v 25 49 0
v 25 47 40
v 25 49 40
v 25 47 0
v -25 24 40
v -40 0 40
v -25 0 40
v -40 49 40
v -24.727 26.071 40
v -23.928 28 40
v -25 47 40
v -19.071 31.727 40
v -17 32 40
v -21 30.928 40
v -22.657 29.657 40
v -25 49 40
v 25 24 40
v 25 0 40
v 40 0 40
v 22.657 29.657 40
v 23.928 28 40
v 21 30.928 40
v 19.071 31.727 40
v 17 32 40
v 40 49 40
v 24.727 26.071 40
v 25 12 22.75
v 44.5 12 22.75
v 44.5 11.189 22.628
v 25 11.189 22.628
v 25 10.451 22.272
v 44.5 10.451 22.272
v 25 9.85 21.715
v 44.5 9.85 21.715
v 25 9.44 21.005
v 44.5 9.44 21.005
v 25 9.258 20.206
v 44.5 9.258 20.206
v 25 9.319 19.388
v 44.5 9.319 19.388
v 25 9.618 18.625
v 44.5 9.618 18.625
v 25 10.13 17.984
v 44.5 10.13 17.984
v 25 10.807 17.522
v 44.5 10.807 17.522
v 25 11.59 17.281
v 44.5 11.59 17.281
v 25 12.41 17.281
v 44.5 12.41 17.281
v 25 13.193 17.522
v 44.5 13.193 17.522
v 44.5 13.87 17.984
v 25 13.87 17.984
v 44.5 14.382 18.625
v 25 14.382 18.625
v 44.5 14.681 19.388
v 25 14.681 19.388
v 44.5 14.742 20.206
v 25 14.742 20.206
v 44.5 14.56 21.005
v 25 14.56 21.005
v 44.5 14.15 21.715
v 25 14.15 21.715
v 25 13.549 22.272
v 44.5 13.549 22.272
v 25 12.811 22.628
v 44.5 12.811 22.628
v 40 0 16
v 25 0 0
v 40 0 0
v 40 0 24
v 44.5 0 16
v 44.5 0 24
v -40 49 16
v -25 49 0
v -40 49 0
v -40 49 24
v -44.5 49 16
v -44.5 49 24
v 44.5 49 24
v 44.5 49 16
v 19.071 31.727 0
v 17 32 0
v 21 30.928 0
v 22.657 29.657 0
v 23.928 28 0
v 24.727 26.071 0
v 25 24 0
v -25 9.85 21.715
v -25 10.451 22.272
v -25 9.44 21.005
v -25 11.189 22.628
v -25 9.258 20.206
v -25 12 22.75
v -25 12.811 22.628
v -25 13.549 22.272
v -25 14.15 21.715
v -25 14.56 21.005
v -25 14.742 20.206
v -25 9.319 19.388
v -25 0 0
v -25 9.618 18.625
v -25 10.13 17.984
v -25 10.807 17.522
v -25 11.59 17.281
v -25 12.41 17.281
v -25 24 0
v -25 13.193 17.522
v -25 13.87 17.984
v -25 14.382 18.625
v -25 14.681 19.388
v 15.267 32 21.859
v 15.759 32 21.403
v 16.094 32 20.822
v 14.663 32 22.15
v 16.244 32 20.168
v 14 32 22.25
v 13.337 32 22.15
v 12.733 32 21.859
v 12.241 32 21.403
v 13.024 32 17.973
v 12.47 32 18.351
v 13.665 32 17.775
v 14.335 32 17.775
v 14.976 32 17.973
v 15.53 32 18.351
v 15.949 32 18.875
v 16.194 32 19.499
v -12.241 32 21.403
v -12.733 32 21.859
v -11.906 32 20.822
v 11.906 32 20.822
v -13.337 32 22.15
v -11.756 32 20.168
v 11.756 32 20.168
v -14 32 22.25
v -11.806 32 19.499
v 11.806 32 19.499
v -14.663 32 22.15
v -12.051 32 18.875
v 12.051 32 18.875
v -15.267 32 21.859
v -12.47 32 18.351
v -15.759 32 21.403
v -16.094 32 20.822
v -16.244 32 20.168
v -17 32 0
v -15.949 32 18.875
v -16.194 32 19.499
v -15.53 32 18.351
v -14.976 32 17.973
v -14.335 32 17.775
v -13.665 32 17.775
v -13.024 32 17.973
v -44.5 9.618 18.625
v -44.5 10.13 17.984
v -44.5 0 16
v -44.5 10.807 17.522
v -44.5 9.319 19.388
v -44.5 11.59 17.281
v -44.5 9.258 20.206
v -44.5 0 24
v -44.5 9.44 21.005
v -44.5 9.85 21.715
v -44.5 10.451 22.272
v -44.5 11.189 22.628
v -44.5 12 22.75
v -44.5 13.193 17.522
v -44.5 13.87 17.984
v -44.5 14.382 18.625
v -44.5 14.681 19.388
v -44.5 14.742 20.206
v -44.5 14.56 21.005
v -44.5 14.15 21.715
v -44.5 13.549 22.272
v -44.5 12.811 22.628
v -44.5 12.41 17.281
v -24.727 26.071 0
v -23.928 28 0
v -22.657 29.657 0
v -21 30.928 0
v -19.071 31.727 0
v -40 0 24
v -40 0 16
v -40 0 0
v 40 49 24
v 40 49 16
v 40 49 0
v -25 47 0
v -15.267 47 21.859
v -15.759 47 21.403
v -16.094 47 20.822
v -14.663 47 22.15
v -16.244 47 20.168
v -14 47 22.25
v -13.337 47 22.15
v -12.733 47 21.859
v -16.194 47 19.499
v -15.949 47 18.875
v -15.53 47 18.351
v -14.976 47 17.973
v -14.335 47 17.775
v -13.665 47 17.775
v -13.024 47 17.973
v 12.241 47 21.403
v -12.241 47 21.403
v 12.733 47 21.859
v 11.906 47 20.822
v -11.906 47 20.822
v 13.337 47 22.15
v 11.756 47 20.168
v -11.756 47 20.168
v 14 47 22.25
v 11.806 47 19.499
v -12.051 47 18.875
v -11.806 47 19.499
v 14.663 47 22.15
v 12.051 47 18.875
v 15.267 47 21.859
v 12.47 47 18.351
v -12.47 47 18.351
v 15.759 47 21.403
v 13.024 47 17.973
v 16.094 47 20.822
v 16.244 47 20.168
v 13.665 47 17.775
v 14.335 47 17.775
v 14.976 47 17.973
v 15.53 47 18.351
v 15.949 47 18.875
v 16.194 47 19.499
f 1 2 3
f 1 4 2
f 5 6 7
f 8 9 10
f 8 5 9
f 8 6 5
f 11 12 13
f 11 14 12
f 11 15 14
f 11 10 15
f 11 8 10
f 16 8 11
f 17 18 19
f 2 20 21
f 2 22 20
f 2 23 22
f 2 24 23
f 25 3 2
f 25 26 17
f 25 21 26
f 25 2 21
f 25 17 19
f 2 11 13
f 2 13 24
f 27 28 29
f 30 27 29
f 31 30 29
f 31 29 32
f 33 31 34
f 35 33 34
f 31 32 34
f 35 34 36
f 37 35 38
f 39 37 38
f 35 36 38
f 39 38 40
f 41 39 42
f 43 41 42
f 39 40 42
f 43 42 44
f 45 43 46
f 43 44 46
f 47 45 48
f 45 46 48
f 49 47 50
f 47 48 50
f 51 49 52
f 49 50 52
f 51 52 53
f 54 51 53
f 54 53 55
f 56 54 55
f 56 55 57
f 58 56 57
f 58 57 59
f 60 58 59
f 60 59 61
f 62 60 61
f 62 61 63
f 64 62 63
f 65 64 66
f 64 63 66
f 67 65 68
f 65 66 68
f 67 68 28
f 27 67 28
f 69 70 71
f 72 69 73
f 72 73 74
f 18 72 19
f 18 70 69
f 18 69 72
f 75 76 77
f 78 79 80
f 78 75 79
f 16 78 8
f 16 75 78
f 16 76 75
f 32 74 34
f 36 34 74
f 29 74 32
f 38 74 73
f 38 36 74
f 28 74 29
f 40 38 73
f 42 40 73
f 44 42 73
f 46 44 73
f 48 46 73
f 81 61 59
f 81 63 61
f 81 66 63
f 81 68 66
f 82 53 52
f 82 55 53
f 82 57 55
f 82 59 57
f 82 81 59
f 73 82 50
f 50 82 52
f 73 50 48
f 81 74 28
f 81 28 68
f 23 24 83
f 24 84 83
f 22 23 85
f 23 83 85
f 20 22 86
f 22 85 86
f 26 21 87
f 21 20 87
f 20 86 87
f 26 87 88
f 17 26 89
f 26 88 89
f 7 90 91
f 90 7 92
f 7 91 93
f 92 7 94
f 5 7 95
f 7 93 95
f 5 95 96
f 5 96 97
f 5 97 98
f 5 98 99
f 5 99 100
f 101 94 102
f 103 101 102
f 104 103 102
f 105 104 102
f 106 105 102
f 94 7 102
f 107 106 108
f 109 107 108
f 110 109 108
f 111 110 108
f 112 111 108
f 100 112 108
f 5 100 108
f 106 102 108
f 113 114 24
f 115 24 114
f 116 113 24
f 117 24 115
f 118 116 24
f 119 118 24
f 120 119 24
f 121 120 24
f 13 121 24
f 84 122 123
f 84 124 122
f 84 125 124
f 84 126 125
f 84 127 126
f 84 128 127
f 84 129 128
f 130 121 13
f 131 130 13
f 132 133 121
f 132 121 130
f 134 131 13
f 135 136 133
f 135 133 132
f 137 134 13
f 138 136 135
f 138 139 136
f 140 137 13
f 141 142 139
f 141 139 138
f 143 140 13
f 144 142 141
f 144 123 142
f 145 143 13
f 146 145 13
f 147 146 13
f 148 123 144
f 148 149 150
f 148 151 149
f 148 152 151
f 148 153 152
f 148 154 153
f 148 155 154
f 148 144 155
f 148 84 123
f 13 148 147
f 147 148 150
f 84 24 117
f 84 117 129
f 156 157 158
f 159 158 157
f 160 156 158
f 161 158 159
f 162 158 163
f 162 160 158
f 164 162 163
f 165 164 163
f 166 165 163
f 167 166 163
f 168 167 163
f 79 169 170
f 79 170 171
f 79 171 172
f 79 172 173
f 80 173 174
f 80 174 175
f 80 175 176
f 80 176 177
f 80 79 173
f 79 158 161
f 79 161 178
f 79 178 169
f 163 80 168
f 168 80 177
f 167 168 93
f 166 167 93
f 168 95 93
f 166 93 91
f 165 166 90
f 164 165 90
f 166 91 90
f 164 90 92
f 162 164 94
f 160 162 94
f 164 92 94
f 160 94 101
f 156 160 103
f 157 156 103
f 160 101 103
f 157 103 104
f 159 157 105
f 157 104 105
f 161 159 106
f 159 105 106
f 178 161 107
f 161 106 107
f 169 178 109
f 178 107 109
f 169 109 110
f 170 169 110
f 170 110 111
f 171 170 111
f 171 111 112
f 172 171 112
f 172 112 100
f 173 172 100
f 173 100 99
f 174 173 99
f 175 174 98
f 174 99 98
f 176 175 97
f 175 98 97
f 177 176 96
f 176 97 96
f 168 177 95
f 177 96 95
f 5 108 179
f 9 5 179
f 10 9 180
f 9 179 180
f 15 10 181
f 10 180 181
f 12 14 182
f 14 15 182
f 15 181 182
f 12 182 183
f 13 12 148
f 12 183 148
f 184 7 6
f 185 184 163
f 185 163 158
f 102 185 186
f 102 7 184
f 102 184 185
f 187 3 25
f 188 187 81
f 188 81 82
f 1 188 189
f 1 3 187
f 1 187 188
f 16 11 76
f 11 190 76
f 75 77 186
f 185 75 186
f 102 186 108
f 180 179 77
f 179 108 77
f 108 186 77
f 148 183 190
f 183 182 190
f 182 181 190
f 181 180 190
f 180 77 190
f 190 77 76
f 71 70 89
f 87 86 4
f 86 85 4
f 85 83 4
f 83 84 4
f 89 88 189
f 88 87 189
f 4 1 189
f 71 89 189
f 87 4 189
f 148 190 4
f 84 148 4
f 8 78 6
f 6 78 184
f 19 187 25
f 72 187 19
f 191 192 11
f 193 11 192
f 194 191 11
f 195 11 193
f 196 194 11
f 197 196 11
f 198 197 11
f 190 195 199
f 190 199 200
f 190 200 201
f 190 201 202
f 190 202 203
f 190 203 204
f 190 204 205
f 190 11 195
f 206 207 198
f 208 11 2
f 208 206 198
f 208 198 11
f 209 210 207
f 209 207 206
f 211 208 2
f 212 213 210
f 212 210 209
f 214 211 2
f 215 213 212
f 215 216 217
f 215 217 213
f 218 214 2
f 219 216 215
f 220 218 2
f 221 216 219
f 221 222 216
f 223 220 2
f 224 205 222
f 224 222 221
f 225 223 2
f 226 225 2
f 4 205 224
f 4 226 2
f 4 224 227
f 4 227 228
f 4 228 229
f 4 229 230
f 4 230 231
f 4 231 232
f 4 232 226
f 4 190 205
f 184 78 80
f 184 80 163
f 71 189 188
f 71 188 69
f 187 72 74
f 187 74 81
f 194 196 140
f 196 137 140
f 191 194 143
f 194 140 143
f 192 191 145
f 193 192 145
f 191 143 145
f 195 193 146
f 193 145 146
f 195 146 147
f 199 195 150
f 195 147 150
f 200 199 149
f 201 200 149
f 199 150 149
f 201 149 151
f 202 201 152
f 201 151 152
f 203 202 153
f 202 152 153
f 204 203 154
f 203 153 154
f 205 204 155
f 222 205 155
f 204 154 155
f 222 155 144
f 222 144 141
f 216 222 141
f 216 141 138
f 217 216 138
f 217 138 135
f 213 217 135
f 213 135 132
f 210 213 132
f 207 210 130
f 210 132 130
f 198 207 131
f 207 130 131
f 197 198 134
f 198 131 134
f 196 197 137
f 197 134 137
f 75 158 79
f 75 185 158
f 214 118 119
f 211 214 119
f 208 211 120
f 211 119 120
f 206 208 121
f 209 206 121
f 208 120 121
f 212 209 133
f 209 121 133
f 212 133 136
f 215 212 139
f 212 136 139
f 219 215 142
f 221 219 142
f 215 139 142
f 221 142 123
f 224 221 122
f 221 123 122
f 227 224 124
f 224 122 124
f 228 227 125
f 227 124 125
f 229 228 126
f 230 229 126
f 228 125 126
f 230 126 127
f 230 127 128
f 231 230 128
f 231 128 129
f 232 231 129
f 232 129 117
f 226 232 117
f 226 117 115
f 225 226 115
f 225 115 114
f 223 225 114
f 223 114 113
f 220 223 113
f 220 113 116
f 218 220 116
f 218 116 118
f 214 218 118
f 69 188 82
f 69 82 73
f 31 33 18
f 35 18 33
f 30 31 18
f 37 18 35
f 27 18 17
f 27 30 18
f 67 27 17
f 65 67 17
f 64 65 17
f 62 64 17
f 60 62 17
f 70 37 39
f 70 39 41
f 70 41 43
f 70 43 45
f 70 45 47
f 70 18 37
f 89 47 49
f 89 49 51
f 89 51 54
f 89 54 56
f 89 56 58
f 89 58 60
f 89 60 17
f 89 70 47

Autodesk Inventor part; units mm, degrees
ref_plane "YZ Plane" through (0, 0, 0) normal (1, 0, 0) x (0, 1, 0)
ref_plane "XZ Plane" through (0, 0, 0) normal (0, 1, 0) x (-1, 0, 0)
ref_plane "XY Plane" through (0, 0, 0) normal (0, 0, 1) x (1, 0, 0)
sketch "Skizze1" plane through (0, 0, 0) normal (0, 0, 1) x (1, 0, 0)
  line L0 (25, 49) -> (40, 49)
  line L1 (40, 49) -> (40, 0)
  line L2 (40, 0) -> (25, 0)
  line L3 (25, 0) -> (25, 24)
  line L4 (17, 32) -> (0, 32)
  line L5 (0, 32) -> (0, 0) construction
  line L6 (0, -9.8) -> (0, 58.8) construction
  line L7 (-56, 0) -> (56, 0) construction
  line L8 (0, 47) -> (25, 47)
  line L9 (25, 47) -> (25, 49)
  arc A0 (25, 24) -> (17, 32) centre (17, 24) ccw
  line L10 (25, 12) -> (40, 12) construction
  line L11 (-25, 49) -> (-40, 49)
  line L12 (-40, 49) -> (-40, 0)
  line L13 (-40, 0) -> (-25, 0)
  line L14 (-25, 0) -> (-25, 24)
  line L15 (-17, 32) -> (0, 32)
  line L16 (0, 47) -> (-25, 47)
  line L17 (-25, 47) -> (-25, 49)
  arc A1 (-17, 32) -> (-25, 24) centre (-17, 24) ccw
  line L18 (-25, 12) -> (-40, 12) construction
  line L19 (25, 14.5) -> (40, 14.5) construction
  line L20 (40, 14.5) -> (40, 9.5) construction
  line L21 (40, 9.5) -> (25, 9.5) construction
  line L22 (25, 9.5) -> (25, 14.5) construction
  dimension "d0" = 15
  dimension "d1" = 2
  dimension "d2" = 80
  dimension "d4" = 50
  dimension "d5" = 8
  dimension "d6" = 12
  dimension "d7" = 15
  dimension "d8" = 5
extrude "Extrusion1" add sketch "Skizze1" along normal blind 40
sketch "Skizze2" plane through (-25, 47, 0) normal (0, 1, 0) x (1, 0, 0)
  line L0 (50, 0) -> (0, 0) construction
  line L1 (0, 0) -> (0, -40) construction
  line L2 (50, -40) -> (0, -40) construction
  line L3 (50, 0) -> (50, -40) construction
  line L4 (0, 0) -> (0, -40) construction
  line L5 (0, -20) -> (50, -20) construction
  line L6 (50, 0) -> (50, -40) construction
  line L7 (25, -20) -> (25, -40) construction
  line L8 (50, -40) -> (0, -40) construction
  point P0 (25, 0)
  point P1 (11, -20)
  point P2 (39, -20)
  dimension "d11" = 14
  dimension "d12" = 14
hole "Bohrung1" at (-14, 47, 20) at (14, 47, 20) direction (0, -1, 0) diameter 4.5 end through all clearance for "Sechskantkopfschraube DIN EN 24017" size "M4" standard "DIN"
sketch "Skizze3" plane through (-40, 0, 0) normal (-1, 0, 0) x (0, 0, 1)
  line L0 (0, 24) -> (0, 0) construction
  line L1 (0, 0) -> (40, 0) construction
  line L2 (40, 24) -> (40, 0) construction
  line L3 (0, 24) -> (40, 24) construction
  line L4 (0, 24) -> (40, 24) construction
  line L5 (20, 24) -> (20, 12) construction
  line L6 (20, 12) -> (40, 12) construction
  point P0 (0, 0)
hole "Bohrung2" at (-40, 12, 20) direction (1, 0, 0) diameter 5.5 end through all clearance for "Sechskantkopfschraube DIN EN 24017" size "M5" standard "DIN"
sketch "Skizze4" plane through (40, 0, 0) normal (1, 0, 0) x (0, 0, -1)
  circle A0 centre (-20, 12) radius 2.75 construction
  line L0 (0, 0) -> (0, 49) construction
  line L1 (0, 49) -> (-40, 49) construction
  line L2 (-40, 0) -> (-40, 49) construction
  line L3 (0, 0) -> (-40, 0) construction
  line L4 (0, 0) -> (-40, 0) construction
  line L5 (-20, 0) -> (-20, 49) construction
  line L6 (-24, 49) -> (-16, 49)
  line L7 (-16, 49) -> (-16, 0)
  line L8 (-16, 0) -> (-24, 0)
  line L9 (-24, 0) -> (-24, 49)
  line L10 (-24, 49) -> (-16, 0) construction
  line L11 (-16, 49) -> (-24, 0) construction
  point P0 (-20, 24.5)
  dimension "d28" = 8
extrude "Extrusion2" add sketch "Skizze4" along normal blind 4.5
ref_plane "Arbeitsebene1" through (0, 0, 0) normal (-1, 0, 0) x (0, 0, 1)
mirror "Spiegeln1" about plane through (0, 0, 0) normal (-1, 0, 0) of "Extrusion2"
delete faces "Fläche löschen1" heal yes whole lump no faces at (40, 10.7843, 19.0833)
delete faces "Fläche löschen2" heal yes whole lump no faces at (-40, 12.2194, 20.89)
equation "\"d2\" = Motor_Frame_FixationPlate_Width"
equation "\"d4\" = Fixation_Width"
equation "\"d9\" = Fixation_Thickness"
equation "\"d11\" = 0.5 * FixationHole_Dist"
equation "\"d12\" = d11"
equation "\"Motor_Frame_FixationPlate_Width\" = 80"
equation "\"Fixation_Width\" = 50"
equation "\"Fixation_Thickness\" = 40"
equation "\"FixationHole_Dist\" = 28"
properties part number "Motor_MainAxis_Frame_Fixation" material "PBT-Kunststoff"
